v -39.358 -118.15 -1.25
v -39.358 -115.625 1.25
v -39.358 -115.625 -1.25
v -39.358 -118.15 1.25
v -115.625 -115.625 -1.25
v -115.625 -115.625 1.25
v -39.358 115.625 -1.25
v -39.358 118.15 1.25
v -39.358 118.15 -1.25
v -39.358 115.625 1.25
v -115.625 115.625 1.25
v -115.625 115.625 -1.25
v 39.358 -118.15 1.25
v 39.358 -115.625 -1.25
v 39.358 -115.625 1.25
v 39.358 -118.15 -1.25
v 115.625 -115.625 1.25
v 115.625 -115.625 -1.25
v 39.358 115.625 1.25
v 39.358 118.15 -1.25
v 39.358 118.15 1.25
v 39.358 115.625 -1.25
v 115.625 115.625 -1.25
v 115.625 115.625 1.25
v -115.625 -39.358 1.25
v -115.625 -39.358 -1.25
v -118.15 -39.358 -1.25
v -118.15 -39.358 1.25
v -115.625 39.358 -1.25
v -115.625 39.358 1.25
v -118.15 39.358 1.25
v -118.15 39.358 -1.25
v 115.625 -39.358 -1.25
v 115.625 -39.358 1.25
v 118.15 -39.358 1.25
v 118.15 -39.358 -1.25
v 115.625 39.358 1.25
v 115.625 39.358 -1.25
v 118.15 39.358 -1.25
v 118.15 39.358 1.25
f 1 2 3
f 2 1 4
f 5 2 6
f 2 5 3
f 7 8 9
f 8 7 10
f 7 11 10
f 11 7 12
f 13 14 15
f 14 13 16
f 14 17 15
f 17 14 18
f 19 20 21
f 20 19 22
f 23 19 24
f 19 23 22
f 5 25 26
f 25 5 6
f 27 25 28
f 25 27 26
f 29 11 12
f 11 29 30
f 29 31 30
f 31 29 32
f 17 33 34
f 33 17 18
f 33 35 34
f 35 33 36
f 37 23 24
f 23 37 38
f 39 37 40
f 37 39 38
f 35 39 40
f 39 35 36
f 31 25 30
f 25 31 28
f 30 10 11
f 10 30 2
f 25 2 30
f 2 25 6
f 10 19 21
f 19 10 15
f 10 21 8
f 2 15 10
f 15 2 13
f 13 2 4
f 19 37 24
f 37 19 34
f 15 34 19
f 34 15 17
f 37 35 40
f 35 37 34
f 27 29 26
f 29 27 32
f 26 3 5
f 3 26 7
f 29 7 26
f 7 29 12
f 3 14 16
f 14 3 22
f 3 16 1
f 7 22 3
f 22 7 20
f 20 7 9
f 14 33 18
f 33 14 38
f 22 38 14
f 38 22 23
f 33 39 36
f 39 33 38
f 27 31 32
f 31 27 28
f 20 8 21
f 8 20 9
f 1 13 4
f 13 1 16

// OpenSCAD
// file: config.scad
// all measures in millimeters

// material to cut the model parts from
material_z = 2.5;
//material_z = 3;

// size of the shield walls to fit inside the container
size_x = 240.5 - 4.2;
size_y = size_x;
size_z = 105;
nothing = 0.05;

/*
size_x = 50;
size_y = size_x;
size_z = size_x/2.4;
nothing = 0;
*/
// main file
include <config.scad>;

module top()
{
    difference()
    {
        cube([
            size_x,
            size_y,
            material_z
            ], center=true);

        for (x = [
                -size_x/2 + size_x/6,
                +size_x/2 - size_x/6
                ])
            for (y = [
                    -size_y/2 + material_z/2,
                    +size_y/2 - material_z/2
                    ])
            {
                translate([
                    x,
                    y,
                    0
                    ])
                cube([
                    size_x/3 + nothing,
                    material_z + nothing,
                    material_z + nothing
                    ], center=true);
            }

        for (x = [
                -size_x/2 + material_z/2,
                +size_x/2 - material_z/2
                ])
            for (y = [
                    -size_y/3,
                    +size_y/3
                    ])
            {
                translate([
                    x,
                    y,
                    0
                    ])
                cube([
                    material_z + nothing,
                    size_y/3 + nothing,
                    material_z + nothing
                    ], center=true);
            }
    }
}

top();
